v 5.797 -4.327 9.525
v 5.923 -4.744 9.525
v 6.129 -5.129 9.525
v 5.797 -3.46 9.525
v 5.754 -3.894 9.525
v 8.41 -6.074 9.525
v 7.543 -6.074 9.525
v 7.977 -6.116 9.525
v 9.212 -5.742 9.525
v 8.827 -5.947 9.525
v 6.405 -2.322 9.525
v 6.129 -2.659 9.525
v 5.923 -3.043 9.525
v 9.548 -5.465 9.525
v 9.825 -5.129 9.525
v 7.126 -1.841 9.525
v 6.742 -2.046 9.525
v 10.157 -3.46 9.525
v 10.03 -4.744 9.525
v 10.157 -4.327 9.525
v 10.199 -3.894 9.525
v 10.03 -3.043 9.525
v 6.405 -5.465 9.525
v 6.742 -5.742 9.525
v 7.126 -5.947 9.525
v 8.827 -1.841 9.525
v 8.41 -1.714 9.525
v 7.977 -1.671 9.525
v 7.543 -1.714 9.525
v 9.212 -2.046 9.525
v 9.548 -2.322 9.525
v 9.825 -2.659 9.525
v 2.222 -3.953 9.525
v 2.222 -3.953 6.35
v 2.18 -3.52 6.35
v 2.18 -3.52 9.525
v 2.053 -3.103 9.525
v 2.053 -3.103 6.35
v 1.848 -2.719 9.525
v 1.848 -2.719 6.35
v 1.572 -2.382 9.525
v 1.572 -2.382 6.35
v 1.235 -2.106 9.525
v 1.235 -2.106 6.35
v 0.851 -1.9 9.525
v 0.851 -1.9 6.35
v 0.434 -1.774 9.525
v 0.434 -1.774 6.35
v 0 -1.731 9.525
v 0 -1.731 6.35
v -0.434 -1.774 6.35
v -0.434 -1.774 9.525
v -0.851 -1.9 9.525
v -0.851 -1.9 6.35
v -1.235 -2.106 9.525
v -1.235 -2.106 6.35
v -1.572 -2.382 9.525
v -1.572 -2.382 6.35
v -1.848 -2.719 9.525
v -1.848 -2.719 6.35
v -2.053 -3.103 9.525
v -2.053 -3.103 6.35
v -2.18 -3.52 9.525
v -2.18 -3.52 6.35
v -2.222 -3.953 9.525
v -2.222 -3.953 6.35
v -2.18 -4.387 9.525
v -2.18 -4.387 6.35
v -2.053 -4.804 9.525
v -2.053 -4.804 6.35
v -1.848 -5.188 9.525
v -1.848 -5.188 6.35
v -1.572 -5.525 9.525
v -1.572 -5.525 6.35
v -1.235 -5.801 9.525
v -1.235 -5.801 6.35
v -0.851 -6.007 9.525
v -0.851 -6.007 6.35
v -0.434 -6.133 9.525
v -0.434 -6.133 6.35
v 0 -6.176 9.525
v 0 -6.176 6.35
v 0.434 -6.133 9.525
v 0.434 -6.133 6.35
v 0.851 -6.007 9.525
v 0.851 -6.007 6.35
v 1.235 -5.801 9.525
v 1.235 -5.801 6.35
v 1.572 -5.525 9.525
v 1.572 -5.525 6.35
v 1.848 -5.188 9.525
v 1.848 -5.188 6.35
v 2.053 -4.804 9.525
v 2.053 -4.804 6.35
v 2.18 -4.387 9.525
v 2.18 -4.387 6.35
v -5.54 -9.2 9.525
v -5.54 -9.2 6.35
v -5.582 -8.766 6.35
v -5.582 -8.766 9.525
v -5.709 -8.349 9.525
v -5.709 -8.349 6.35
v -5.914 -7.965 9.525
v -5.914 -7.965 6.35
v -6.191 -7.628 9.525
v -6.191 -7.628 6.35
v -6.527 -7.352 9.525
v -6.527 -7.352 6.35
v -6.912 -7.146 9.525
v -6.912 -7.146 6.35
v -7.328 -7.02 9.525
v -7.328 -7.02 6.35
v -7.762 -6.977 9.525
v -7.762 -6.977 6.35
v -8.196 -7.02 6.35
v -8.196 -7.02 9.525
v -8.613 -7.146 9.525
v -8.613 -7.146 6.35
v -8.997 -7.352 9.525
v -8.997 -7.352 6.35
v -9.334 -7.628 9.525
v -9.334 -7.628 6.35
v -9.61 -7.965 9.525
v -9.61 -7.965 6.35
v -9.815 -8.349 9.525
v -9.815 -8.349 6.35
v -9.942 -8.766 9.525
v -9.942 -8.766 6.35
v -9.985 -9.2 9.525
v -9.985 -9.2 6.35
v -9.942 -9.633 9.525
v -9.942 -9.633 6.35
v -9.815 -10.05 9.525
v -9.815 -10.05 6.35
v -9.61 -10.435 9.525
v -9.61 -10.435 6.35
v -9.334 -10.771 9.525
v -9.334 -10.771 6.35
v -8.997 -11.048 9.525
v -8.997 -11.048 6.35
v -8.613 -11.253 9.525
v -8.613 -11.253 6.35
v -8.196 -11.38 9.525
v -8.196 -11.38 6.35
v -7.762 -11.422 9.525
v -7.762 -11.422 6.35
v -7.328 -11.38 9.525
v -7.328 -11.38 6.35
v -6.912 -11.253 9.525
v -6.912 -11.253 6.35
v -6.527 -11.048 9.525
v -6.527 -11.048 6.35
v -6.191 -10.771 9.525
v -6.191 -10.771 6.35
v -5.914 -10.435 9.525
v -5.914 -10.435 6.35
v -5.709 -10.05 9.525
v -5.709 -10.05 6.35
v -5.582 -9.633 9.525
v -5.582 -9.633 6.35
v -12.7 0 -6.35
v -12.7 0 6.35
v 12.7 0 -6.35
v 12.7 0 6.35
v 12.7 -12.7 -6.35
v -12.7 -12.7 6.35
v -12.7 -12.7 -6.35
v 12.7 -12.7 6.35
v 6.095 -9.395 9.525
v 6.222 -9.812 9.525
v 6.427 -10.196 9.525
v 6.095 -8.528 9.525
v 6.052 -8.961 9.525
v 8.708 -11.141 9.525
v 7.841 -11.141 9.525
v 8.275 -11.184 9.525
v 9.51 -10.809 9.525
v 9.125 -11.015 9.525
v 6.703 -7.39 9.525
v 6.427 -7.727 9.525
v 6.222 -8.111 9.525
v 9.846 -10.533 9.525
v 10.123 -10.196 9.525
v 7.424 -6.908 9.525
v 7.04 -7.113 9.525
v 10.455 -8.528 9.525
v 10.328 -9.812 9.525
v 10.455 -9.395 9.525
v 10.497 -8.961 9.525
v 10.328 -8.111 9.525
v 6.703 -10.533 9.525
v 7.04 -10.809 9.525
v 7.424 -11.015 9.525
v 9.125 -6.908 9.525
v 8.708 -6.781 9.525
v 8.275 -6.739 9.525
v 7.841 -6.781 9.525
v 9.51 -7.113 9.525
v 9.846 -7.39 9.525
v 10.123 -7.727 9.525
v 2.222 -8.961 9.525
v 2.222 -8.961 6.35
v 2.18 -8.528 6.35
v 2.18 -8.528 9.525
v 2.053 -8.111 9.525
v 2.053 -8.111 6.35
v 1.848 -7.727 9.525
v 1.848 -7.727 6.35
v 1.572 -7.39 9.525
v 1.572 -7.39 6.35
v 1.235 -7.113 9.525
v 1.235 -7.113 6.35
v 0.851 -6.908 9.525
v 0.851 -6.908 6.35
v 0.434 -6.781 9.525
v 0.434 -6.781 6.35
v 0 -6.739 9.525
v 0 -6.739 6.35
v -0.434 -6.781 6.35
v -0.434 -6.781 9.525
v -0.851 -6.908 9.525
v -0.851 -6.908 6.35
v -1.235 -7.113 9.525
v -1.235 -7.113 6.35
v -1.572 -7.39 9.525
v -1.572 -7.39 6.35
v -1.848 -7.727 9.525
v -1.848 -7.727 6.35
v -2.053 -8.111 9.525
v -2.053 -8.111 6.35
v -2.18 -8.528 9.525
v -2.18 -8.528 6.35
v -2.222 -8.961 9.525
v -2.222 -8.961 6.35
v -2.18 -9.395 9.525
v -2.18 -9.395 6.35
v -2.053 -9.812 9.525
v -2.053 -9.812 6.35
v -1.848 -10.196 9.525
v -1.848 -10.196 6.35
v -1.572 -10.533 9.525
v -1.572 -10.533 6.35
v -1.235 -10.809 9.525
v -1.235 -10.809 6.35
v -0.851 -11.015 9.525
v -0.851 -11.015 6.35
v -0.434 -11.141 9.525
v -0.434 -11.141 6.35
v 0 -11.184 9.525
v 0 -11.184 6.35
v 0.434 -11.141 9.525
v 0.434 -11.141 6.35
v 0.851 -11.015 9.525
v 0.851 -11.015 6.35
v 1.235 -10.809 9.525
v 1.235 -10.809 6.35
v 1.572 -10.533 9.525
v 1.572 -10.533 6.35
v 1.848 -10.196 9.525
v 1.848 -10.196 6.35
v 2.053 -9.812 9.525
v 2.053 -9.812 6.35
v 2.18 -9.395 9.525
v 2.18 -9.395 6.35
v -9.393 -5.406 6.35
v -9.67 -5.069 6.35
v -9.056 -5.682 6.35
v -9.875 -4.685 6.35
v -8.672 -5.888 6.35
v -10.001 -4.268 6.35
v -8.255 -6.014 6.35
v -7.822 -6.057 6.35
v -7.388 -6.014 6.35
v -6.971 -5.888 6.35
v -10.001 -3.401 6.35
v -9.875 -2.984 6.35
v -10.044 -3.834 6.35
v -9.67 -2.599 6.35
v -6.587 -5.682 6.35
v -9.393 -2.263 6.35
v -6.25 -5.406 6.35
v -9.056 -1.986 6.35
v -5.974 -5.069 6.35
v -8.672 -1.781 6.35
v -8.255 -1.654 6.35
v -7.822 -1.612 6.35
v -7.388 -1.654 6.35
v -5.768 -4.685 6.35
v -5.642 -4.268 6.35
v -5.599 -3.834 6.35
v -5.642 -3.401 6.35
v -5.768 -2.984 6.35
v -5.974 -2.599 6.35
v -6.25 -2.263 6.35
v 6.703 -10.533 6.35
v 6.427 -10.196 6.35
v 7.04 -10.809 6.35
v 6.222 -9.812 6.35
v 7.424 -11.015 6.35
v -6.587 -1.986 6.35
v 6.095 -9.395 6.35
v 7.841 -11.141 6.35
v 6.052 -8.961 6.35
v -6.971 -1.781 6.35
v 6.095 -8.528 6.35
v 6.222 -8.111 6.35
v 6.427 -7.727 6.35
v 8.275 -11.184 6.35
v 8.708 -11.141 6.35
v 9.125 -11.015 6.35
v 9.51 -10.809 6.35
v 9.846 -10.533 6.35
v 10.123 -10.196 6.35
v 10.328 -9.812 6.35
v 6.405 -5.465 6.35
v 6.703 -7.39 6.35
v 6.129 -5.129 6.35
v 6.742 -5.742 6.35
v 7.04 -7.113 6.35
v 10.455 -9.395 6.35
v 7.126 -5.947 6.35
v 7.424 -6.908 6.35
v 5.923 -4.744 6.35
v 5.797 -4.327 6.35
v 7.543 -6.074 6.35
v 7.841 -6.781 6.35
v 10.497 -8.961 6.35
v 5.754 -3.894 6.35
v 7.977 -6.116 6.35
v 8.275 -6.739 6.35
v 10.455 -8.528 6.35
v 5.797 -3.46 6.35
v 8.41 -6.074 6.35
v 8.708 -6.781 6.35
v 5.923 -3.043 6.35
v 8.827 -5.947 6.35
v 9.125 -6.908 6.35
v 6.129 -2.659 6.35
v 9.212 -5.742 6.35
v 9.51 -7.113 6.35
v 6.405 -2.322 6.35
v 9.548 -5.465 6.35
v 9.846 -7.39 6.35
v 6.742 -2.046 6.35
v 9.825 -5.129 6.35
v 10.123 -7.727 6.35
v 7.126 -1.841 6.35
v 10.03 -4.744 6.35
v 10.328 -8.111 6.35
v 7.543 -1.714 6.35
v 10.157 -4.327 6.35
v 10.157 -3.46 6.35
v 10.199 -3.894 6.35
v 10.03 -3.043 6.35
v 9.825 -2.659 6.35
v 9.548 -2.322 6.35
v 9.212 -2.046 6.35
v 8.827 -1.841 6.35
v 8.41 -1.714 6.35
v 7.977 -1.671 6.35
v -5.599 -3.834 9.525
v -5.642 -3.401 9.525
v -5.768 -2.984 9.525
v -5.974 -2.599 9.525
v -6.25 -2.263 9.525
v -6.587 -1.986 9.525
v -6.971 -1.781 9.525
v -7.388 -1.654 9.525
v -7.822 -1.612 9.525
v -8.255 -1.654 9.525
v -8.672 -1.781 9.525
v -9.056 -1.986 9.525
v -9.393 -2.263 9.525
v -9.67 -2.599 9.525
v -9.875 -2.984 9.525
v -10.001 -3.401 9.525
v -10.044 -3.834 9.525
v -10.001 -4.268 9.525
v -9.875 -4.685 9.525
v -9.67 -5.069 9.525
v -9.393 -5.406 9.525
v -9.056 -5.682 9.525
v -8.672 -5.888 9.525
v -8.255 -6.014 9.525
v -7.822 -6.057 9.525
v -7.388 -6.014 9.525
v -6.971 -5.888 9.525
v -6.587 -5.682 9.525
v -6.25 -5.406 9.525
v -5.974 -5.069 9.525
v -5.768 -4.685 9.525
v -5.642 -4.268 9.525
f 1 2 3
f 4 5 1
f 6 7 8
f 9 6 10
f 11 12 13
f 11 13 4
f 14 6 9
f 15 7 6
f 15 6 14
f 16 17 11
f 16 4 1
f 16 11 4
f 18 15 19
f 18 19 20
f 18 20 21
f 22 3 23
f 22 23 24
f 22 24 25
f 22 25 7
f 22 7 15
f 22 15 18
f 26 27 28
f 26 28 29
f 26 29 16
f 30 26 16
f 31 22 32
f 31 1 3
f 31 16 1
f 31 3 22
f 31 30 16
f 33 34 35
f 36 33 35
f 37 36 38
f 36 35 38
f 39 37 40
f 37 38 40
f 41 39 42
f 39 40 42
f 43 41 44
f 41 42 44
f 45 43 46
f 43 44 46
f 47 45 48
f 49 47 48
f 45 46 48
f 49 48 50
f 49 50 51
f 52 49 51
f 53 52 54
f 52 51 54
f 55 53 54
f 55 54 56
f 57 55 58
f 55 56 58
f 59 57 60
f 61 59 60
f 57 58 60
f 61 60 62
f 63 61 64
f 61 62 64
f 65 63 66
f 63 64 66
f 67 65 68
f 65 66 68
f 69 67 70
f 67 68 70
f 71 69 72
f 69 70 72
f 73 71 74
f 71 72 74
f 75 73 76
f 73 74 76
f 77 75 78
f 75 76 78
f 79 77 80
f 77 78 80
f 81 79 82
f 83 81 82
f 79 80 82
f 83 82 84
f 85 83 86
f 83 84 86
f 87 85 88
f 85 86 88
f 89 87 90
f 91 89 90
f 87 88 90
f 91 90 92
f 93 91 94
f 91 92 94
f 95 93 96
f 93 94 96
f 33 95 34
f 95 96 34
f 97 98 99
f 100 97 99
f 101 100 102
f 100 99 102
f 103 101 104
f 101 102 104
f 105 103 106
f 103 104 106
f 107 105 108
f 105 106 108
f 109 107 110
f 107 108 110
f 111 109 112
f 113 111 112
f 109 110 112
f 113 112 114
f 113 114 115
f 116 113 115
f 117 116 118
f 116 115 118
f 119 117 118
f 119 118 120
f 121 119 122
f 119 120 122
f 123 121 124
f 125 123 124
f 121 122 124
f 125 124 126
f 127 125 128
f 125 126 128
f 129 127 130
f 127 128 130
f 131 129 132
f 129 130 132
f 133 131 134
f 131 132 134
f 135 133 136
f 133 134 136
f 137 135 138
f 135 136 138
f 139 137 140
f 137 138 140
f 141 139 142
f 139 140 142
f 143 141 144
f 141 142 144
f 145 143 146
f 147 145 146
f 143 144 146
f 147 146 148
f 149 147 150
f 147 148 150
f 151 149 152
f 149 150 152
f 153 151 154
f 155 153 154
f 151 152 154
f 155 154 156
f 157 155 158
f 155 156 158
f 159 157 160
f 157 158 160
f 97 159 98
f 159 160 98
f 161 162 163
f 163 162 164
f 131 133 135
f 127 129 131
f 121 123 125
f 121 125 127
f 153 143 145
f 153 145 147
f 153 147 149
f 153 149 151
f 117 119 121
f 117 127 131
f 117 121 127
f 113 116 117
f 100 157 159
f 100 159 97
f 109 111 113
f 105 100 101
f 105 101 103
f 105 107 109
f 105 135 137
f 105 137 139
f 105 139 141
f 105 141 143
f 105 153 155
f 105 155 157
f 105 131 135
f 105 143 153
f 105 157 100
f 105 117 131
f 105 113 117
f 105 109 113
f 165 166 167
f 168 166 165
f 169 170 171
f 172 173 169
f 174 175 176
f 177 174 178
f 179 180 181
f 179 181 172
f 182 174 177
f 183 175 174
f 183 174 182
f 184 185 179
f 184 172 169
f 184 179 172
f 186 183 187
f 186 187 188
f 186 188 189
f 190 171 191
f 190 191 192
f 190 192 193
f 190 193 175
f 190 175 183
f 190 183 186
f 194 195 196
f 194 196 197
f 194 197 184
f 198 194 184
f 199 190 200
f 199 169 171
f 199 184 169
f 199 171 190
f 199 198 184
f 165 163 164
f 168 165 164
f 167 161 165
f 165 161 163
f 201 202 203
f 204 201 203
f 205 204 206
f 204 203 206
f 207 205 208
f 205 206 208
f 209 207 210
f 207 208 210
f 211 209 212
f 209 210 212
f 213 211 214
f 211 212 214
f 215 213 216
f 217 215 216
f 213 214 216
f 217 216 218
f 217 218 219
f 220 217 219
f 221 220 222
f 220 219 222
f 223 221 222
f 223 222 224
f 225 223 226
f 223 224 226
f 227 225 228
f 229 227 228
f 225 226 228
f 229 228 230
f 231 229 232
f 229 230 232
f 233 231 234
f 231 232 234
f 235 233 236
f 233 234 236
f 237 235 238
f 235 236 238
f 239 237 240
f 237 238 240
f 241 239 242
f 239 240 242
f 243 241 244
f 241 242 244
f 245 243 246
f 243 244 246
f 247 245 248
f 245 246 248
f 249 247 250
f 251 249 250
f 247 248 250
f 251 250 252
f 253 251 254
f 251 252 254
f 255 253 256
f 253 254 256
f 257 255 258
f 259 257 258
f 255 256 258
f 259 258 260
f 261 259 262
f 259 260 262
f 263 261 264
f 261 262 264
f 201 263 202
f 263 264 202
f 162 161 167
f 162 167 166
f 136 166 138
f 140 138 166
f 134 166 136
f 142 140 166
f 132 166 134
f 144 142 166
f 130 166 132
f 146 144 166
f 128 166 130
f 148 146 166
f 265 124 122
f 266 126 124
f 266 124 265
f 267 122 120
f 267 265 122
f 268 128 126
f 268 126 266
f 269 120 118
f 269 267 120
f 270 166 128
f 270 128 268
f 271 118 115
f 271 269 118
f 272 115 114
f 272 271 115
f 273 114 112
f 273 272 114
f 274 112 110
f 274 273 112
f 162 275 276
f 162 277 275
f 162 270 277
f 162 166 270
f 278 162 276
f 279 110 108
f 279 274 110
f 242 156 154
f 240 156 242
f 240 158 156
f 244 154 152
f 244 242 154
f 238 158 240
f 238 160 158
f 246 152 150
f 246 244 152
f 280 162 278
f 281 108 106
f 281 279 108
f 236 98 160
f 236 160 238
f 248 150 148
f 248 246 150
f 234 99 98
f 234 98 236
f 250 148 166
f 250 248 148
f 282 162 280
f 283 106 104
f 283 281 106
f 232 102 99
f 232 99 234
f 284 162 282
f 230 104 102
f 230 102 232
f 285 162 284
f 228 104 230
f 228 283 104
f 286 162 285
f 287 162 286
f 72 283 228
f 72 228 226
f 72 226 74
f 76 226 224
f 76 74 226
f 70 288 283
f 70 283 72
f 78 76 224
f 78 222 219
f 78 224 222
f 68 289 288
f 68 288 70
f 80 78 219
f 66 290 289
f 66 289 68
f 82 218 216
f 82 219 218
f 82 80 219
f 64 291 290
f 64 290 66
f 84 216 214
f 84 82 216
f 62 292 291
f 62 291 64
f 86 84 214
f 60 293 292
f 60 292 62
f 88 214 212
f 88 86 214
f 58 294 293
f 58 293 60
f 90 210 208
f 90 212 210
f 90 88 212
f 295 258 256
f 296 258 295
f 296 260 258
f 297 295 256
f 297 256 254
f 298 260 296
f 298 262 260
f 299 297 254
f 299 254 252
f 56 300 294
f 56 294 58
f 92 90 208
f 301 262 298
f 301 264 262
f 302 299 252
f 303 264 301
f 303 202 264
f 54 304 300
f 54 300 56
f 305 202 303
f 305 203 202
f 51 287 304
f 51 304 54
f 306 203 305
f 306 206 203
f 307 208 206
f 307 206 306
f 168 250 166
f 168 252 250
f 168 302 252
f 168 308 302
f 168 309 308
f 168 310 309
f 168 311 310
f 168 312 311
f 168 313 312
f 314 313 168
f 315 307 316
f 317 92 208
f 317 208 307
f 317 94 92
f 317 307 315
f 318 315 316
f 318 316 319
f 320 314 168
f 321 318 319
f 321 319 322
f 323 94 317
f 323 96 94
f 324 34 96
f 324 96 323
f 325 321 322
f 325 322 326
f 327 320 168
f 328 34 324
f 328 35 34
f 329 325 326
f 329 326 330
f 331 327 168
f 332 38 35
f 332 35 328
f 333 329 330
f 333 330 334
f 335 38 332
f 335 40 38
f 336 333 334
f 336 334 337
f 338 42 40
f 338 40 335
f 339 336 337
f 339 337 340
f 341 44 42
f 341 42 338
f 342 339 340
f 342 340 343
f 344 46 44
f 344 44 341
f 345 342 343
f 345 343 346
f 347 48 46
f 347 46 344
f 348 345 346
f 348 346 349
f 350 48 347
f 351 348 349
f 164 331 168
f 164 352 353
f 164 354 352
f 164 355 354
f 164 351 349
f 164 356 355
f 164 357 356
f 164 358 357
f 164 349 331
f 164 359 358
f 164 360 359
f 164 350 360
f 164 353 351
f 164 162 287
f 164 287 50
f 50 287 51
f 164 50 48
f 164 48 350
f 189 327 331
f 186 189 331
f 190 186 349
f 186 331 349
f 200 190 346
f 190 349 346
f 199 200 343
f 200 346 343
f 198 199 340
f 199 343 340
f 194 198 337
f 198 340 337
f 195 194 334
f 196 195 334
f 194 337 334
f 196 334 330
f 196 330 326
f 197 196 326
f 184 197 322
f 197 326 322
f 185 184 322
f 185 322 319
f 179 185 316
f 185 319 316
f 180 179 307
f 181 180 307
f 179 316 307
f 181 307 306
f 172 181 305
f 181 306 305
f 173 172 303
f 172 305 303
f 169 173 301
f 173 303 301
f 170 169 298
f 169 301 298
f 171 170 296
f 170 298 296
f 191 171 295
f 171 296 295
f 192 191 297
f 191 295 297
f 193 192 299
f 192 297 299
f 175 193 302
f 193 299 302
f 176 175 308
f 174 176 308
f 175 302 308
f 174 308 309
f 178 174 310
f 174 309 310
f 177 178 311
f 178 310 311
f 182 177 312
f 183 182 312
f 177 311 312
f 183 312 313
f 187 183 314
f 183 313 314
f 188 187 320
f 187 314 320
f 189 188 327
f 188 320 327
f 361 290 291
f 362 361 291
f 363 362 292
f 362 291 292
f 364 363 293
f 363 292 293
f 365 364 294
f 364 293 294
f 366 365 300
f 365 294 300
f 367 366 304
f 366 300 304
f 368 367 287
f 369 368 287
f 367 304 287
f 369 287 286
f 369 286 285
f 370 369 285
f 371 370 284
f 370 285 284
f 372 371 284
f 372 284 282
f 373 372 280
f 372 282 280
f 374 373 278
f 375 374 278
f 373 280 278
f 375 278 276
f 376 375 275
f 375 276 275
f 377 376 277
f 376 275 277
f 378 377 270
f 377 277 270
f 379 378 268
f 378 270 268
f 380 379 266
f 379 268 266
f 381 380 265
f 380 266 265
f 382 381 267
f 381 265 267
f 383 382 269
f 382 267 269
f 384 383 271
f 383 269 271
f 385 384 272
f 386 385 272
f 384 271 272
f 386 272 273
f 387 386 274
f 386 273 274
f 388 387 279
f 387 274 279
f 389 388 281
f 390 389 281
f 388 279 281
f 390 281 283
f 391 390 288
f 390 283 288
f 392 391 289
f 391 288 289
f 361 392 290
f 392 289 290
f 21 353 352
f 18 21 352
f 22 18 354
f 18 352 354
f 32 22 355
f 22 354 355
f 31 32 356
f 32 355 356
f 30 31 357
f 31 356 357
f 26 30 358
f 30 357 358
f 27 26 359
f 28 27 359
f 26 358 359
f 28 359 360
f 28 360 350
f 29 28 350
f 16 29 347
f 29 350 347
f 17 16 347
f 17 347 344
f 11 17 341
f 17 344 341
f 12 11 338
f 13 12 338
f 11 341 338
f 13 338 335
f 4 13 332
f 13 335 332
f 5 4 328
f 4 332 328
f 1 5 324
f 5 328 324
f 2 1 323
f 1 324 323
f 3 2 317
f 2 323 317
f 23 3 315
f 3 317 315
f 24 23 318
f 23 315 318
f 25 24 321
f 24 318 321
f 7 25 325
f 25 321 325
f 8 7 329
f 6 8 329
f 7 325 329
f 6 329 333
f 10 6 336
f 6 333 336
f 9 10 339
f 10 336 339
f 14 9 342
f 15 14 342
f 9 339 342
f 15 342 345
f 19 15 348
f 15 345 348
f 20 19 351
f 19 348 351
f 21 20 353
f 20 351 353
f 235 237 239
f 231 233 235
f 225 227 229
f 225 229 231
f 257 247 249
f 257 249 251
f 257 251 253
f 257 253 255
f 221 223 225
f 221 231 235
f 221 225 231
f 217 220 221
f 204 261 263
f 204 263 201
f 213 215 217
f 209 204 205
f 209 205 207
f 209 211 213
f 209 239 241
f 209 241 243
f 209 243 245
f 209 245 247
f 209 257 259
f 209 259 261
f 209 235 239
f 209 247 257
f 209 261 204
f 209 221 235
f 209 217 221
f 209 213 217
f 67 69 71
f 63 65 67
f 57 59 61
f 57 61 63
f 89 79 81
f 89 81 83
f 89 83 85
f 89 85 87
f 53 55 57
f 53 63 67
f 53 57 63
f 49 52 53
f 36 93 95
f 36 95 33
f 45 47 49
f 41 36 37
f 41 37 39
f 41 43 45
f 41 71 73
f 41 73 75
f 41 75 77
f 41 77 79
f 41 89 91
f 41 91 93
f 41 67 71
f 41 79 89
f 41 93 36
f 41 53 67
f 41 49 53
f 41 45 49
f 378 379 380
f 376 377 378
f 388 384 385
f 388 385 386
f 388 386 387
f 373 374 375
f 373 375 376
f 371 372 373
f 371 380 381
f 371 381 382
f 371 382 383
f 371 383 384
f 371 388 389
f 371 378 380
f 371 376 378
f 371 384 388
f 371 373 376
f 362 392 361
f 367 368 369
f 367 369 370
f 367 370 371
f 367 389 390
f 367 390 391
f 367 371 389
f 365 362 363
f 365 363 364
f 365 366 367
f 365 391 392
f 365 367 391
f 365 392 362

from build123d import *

# Parameters (mm, degrees)
F0_W     = 25.4
F0_H     = 12.7
F1_DEPTH = 12.7
F2_R     = 2.2225
F3_DEPTH = 3.175


with BuildPart() as f1:
    # F0 (on Front) → F1 (new body)
    with BuildSketch(Plane.XZ):
        Rectangle(F0_W, F0_H)
    extrude(amount=F1_DEPTH)

    # F2 (on face) → F3 (join)
    with BuildSketch(Plane.XY.offset(6.35)):
        with Locations((-7.762069, -9.199759)):
            Circle(F2_R)
        with Locations((0, -8.961292)):
            Circle(F2_R)
        with Locations((8.274858, -8.961292)):
            Circle(F2_R)
        with Locations((7.976773, -3.893862)):
            Circle(F2_R)
        with Locations((0, -3.953478)):
            Circle(F2_R)
        with Locations((-7.821687, -3.834245)):
            Circle(F2_R)
    extrude(amount=F3_DEPTH)


solid = f1.part
